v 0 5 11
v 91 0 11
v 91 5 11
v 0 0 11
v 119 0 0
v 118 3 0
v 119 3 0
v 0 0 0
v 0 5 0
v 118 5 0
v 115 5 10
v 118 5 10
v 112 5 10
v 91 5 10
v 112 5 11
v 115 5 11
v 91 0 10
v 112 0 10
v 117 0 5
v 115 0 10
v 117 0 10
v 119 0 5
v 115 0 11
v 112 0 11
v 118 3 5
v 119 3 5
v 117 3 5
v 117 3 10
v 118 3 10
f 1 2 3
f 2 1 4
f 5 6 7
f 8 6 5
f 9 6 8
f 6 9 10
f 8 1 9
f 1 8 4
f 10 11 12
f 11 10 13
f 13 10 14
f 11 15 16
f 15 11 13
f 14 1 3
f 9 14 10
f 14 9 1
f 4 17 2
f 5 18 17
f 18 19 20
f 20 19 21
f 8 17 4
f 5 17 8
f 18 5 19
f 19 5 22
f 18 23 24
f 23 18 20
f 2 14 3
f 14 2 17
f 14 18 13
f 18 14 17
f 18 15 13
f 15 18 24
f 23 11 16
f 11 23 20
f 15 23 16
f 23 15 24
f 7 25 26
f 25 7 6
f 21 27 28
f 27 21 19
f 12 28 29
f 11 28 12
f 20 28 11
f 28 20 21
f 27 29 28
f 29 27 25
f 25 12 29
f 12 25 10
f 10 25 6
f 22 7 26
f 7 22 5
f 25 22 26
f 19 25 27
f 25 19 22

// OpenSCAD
translate([3.5, 2.5, 5.5]) color([0.05394001775890156, 0.696805048854085, 0.6656296547984208]) cube([7, 5, 11], center=true);
translate([10.5, 2.5, 5.5]) color([0.6485122289860075, 0.5471816206705559, 0.7344166333532061]) cube([7, 5, 11], center=true);
translate([17.5, 2.5, 5.5]) color([0.4306045068871984, 0.45460236437769275, 0.25475221651879554]) cube([7, 5, 11], center=true);
translate([24.5, 2.5, 5.5]) color([0.47565246533915095, 0.3371942584654095, 0.04223511400675217]) cube([7, 5, 11], center=true);
translate([31.5, 2.5, 5.5]) color([0.05255331220371673, 0.34980223330761895, 0.2898096938030986]) cube([7, 5, 11], center=true);
translate([38.5, 2.5, 5.5]) color([0.007130057665757694, 0.06369015415518986, 0.42774457246440645]) cube([7, 5, 11], center=true);
translate([45.5, 2.5, 5.5]) color([0.22216650821772055, 0.6086379170158094, 0.557768500755667]) cube([7, 5, 11], center=true);
translate([52.5, 2.5, 5.5]) color([0.22097295115667703, 0.19284823789822858, 0.6083188139076446]) cube([7, 5, 11], center=true);
translate([59.5, 2.5, 5.5]) color([0.606354511401297, 0.08562053587131313, 0.31903016062772993]) cube([7, 5, 11], center=true);
translate([66.5, 2.5, 5.5]) color([0.53590115499306, 0.8934753784920533, 0.25549985489866966]) cube([7, 5, 11], center=true);
translate([73.5, 2.5, 5.5]) color([0.5219903070058861, 0.1901317713313112, 0.08011594570868696]) cube([7, 5, 11], center=true);
translate([80.5, 2.5, 5.5]) color([0.8699478397109702, 0.3457472114844995, 0.837290862214726]) cube([7, 5, 11], center=true);
translate([87.5, 2.5, 5.5]) color([0.25127706432840136, 0.7290260027021367, 0.3013213449137814]) cube([7, 5, 11], center=true);
translate([92.5, 2.5, 3.5]) color([0.5169005458056509, 0.38467176448284957, 0.4820846642847386]) cube([3, 5, 7], center=true);
translate([95.5, 2.5, 3.5]) color([0.8719757028853922, 0.2399620044566907, 0.3058147052987177]) cube([3, 5, 7], center=true);
translate([94.5, 2.5, 8.5]) color([0.5519737755681405, 0.009208459116004764, 0.4953005367860557]) cube([7, 5, 3], center=true);
translate([98.5, 2.5, 3.5]) color([0.43819859659275806, 0.9171481192782721, 0.41212019308576986]) cube([3, 5, 7], center=true);
translate([101.5, 2.5, 3.5]) color([0.49358197644734136, 0.44010860560926524, 0.0856157398333921]) cube([3, 5, 7], center=true);
translate([101.5, 2.5, 8.5]) color([0.2411443971002879, 0.8262650576639278, 0.15379567752788093]) cube([7, 5, 3], center=true);
translate([104.5, 2.5, 3.5]) color([0.8842528530898255, 0.2134665283608419, 0.6127566924478359]) cube([3, 5, 7], center=true);
translate([107.5, 2.5, 3.5]) color([0.818008657000479, 0.5590112191053322, 0.8866043301622452]) cube([3, 5, 7], center=true);
translate([110.5, 2.5, 3.5]) color([0.39447102725022787, 0.9589163376419946, 0.24972819156954773]) cube([3, 5, 7], center=true);
translate([108.5, 2.5, 8.5]) color([0.22005049979750413, 0.8404590105346786, 0.2789960200671917]) cube([7, 5, 3], center=true);
translate([113.5, 2.5, 3.5]) color([0.35210354864297055, 0.9946691500756418, 0.10728537706325991]) cube([3, 5, 7], center=true);
translate([113.5, 2.5, 8.0]) color([0.8996256313138141, 0.6100819970747507, 0.7890377134172993]) cube([3, 5, 2], center=true);
translate([113.5, 2.5, 10.0]) color([0.7110679469752405, 0.7774643558396669, 0.5140354678382717]) cube([3, 5, 2], center=true);
translate([116.0, 1.5, 2.5]) color([0.46207744282607, 0.6343562920465169, 0.27254621857246664]) cube([2, 3, 5], center=true);
translate([116.0, 1.5, 7.5]) color([0.016558424522952975, 0.6148716567717017, 0.7119066573597548]) cube([2, 3, 5], center=true);
translate([116.5, 4.0, 2.5]) color([0.17257617960039529, 0.41465974039415787, 0.21806470516739018]) cube([3, 2, 5], center=true);
translate([116.5, 4.0, 7.5]) color([0.8797884787327306, 0.9971497033508181, 0.006439244314443648]) cube([3, 2, 5], center=true);
translate([118.0, 1.5, 2.5]) color([0.5355241113549698, 0.428269623660265, 0.0497703561320445]) cube([2, 3, 5], center=true);
